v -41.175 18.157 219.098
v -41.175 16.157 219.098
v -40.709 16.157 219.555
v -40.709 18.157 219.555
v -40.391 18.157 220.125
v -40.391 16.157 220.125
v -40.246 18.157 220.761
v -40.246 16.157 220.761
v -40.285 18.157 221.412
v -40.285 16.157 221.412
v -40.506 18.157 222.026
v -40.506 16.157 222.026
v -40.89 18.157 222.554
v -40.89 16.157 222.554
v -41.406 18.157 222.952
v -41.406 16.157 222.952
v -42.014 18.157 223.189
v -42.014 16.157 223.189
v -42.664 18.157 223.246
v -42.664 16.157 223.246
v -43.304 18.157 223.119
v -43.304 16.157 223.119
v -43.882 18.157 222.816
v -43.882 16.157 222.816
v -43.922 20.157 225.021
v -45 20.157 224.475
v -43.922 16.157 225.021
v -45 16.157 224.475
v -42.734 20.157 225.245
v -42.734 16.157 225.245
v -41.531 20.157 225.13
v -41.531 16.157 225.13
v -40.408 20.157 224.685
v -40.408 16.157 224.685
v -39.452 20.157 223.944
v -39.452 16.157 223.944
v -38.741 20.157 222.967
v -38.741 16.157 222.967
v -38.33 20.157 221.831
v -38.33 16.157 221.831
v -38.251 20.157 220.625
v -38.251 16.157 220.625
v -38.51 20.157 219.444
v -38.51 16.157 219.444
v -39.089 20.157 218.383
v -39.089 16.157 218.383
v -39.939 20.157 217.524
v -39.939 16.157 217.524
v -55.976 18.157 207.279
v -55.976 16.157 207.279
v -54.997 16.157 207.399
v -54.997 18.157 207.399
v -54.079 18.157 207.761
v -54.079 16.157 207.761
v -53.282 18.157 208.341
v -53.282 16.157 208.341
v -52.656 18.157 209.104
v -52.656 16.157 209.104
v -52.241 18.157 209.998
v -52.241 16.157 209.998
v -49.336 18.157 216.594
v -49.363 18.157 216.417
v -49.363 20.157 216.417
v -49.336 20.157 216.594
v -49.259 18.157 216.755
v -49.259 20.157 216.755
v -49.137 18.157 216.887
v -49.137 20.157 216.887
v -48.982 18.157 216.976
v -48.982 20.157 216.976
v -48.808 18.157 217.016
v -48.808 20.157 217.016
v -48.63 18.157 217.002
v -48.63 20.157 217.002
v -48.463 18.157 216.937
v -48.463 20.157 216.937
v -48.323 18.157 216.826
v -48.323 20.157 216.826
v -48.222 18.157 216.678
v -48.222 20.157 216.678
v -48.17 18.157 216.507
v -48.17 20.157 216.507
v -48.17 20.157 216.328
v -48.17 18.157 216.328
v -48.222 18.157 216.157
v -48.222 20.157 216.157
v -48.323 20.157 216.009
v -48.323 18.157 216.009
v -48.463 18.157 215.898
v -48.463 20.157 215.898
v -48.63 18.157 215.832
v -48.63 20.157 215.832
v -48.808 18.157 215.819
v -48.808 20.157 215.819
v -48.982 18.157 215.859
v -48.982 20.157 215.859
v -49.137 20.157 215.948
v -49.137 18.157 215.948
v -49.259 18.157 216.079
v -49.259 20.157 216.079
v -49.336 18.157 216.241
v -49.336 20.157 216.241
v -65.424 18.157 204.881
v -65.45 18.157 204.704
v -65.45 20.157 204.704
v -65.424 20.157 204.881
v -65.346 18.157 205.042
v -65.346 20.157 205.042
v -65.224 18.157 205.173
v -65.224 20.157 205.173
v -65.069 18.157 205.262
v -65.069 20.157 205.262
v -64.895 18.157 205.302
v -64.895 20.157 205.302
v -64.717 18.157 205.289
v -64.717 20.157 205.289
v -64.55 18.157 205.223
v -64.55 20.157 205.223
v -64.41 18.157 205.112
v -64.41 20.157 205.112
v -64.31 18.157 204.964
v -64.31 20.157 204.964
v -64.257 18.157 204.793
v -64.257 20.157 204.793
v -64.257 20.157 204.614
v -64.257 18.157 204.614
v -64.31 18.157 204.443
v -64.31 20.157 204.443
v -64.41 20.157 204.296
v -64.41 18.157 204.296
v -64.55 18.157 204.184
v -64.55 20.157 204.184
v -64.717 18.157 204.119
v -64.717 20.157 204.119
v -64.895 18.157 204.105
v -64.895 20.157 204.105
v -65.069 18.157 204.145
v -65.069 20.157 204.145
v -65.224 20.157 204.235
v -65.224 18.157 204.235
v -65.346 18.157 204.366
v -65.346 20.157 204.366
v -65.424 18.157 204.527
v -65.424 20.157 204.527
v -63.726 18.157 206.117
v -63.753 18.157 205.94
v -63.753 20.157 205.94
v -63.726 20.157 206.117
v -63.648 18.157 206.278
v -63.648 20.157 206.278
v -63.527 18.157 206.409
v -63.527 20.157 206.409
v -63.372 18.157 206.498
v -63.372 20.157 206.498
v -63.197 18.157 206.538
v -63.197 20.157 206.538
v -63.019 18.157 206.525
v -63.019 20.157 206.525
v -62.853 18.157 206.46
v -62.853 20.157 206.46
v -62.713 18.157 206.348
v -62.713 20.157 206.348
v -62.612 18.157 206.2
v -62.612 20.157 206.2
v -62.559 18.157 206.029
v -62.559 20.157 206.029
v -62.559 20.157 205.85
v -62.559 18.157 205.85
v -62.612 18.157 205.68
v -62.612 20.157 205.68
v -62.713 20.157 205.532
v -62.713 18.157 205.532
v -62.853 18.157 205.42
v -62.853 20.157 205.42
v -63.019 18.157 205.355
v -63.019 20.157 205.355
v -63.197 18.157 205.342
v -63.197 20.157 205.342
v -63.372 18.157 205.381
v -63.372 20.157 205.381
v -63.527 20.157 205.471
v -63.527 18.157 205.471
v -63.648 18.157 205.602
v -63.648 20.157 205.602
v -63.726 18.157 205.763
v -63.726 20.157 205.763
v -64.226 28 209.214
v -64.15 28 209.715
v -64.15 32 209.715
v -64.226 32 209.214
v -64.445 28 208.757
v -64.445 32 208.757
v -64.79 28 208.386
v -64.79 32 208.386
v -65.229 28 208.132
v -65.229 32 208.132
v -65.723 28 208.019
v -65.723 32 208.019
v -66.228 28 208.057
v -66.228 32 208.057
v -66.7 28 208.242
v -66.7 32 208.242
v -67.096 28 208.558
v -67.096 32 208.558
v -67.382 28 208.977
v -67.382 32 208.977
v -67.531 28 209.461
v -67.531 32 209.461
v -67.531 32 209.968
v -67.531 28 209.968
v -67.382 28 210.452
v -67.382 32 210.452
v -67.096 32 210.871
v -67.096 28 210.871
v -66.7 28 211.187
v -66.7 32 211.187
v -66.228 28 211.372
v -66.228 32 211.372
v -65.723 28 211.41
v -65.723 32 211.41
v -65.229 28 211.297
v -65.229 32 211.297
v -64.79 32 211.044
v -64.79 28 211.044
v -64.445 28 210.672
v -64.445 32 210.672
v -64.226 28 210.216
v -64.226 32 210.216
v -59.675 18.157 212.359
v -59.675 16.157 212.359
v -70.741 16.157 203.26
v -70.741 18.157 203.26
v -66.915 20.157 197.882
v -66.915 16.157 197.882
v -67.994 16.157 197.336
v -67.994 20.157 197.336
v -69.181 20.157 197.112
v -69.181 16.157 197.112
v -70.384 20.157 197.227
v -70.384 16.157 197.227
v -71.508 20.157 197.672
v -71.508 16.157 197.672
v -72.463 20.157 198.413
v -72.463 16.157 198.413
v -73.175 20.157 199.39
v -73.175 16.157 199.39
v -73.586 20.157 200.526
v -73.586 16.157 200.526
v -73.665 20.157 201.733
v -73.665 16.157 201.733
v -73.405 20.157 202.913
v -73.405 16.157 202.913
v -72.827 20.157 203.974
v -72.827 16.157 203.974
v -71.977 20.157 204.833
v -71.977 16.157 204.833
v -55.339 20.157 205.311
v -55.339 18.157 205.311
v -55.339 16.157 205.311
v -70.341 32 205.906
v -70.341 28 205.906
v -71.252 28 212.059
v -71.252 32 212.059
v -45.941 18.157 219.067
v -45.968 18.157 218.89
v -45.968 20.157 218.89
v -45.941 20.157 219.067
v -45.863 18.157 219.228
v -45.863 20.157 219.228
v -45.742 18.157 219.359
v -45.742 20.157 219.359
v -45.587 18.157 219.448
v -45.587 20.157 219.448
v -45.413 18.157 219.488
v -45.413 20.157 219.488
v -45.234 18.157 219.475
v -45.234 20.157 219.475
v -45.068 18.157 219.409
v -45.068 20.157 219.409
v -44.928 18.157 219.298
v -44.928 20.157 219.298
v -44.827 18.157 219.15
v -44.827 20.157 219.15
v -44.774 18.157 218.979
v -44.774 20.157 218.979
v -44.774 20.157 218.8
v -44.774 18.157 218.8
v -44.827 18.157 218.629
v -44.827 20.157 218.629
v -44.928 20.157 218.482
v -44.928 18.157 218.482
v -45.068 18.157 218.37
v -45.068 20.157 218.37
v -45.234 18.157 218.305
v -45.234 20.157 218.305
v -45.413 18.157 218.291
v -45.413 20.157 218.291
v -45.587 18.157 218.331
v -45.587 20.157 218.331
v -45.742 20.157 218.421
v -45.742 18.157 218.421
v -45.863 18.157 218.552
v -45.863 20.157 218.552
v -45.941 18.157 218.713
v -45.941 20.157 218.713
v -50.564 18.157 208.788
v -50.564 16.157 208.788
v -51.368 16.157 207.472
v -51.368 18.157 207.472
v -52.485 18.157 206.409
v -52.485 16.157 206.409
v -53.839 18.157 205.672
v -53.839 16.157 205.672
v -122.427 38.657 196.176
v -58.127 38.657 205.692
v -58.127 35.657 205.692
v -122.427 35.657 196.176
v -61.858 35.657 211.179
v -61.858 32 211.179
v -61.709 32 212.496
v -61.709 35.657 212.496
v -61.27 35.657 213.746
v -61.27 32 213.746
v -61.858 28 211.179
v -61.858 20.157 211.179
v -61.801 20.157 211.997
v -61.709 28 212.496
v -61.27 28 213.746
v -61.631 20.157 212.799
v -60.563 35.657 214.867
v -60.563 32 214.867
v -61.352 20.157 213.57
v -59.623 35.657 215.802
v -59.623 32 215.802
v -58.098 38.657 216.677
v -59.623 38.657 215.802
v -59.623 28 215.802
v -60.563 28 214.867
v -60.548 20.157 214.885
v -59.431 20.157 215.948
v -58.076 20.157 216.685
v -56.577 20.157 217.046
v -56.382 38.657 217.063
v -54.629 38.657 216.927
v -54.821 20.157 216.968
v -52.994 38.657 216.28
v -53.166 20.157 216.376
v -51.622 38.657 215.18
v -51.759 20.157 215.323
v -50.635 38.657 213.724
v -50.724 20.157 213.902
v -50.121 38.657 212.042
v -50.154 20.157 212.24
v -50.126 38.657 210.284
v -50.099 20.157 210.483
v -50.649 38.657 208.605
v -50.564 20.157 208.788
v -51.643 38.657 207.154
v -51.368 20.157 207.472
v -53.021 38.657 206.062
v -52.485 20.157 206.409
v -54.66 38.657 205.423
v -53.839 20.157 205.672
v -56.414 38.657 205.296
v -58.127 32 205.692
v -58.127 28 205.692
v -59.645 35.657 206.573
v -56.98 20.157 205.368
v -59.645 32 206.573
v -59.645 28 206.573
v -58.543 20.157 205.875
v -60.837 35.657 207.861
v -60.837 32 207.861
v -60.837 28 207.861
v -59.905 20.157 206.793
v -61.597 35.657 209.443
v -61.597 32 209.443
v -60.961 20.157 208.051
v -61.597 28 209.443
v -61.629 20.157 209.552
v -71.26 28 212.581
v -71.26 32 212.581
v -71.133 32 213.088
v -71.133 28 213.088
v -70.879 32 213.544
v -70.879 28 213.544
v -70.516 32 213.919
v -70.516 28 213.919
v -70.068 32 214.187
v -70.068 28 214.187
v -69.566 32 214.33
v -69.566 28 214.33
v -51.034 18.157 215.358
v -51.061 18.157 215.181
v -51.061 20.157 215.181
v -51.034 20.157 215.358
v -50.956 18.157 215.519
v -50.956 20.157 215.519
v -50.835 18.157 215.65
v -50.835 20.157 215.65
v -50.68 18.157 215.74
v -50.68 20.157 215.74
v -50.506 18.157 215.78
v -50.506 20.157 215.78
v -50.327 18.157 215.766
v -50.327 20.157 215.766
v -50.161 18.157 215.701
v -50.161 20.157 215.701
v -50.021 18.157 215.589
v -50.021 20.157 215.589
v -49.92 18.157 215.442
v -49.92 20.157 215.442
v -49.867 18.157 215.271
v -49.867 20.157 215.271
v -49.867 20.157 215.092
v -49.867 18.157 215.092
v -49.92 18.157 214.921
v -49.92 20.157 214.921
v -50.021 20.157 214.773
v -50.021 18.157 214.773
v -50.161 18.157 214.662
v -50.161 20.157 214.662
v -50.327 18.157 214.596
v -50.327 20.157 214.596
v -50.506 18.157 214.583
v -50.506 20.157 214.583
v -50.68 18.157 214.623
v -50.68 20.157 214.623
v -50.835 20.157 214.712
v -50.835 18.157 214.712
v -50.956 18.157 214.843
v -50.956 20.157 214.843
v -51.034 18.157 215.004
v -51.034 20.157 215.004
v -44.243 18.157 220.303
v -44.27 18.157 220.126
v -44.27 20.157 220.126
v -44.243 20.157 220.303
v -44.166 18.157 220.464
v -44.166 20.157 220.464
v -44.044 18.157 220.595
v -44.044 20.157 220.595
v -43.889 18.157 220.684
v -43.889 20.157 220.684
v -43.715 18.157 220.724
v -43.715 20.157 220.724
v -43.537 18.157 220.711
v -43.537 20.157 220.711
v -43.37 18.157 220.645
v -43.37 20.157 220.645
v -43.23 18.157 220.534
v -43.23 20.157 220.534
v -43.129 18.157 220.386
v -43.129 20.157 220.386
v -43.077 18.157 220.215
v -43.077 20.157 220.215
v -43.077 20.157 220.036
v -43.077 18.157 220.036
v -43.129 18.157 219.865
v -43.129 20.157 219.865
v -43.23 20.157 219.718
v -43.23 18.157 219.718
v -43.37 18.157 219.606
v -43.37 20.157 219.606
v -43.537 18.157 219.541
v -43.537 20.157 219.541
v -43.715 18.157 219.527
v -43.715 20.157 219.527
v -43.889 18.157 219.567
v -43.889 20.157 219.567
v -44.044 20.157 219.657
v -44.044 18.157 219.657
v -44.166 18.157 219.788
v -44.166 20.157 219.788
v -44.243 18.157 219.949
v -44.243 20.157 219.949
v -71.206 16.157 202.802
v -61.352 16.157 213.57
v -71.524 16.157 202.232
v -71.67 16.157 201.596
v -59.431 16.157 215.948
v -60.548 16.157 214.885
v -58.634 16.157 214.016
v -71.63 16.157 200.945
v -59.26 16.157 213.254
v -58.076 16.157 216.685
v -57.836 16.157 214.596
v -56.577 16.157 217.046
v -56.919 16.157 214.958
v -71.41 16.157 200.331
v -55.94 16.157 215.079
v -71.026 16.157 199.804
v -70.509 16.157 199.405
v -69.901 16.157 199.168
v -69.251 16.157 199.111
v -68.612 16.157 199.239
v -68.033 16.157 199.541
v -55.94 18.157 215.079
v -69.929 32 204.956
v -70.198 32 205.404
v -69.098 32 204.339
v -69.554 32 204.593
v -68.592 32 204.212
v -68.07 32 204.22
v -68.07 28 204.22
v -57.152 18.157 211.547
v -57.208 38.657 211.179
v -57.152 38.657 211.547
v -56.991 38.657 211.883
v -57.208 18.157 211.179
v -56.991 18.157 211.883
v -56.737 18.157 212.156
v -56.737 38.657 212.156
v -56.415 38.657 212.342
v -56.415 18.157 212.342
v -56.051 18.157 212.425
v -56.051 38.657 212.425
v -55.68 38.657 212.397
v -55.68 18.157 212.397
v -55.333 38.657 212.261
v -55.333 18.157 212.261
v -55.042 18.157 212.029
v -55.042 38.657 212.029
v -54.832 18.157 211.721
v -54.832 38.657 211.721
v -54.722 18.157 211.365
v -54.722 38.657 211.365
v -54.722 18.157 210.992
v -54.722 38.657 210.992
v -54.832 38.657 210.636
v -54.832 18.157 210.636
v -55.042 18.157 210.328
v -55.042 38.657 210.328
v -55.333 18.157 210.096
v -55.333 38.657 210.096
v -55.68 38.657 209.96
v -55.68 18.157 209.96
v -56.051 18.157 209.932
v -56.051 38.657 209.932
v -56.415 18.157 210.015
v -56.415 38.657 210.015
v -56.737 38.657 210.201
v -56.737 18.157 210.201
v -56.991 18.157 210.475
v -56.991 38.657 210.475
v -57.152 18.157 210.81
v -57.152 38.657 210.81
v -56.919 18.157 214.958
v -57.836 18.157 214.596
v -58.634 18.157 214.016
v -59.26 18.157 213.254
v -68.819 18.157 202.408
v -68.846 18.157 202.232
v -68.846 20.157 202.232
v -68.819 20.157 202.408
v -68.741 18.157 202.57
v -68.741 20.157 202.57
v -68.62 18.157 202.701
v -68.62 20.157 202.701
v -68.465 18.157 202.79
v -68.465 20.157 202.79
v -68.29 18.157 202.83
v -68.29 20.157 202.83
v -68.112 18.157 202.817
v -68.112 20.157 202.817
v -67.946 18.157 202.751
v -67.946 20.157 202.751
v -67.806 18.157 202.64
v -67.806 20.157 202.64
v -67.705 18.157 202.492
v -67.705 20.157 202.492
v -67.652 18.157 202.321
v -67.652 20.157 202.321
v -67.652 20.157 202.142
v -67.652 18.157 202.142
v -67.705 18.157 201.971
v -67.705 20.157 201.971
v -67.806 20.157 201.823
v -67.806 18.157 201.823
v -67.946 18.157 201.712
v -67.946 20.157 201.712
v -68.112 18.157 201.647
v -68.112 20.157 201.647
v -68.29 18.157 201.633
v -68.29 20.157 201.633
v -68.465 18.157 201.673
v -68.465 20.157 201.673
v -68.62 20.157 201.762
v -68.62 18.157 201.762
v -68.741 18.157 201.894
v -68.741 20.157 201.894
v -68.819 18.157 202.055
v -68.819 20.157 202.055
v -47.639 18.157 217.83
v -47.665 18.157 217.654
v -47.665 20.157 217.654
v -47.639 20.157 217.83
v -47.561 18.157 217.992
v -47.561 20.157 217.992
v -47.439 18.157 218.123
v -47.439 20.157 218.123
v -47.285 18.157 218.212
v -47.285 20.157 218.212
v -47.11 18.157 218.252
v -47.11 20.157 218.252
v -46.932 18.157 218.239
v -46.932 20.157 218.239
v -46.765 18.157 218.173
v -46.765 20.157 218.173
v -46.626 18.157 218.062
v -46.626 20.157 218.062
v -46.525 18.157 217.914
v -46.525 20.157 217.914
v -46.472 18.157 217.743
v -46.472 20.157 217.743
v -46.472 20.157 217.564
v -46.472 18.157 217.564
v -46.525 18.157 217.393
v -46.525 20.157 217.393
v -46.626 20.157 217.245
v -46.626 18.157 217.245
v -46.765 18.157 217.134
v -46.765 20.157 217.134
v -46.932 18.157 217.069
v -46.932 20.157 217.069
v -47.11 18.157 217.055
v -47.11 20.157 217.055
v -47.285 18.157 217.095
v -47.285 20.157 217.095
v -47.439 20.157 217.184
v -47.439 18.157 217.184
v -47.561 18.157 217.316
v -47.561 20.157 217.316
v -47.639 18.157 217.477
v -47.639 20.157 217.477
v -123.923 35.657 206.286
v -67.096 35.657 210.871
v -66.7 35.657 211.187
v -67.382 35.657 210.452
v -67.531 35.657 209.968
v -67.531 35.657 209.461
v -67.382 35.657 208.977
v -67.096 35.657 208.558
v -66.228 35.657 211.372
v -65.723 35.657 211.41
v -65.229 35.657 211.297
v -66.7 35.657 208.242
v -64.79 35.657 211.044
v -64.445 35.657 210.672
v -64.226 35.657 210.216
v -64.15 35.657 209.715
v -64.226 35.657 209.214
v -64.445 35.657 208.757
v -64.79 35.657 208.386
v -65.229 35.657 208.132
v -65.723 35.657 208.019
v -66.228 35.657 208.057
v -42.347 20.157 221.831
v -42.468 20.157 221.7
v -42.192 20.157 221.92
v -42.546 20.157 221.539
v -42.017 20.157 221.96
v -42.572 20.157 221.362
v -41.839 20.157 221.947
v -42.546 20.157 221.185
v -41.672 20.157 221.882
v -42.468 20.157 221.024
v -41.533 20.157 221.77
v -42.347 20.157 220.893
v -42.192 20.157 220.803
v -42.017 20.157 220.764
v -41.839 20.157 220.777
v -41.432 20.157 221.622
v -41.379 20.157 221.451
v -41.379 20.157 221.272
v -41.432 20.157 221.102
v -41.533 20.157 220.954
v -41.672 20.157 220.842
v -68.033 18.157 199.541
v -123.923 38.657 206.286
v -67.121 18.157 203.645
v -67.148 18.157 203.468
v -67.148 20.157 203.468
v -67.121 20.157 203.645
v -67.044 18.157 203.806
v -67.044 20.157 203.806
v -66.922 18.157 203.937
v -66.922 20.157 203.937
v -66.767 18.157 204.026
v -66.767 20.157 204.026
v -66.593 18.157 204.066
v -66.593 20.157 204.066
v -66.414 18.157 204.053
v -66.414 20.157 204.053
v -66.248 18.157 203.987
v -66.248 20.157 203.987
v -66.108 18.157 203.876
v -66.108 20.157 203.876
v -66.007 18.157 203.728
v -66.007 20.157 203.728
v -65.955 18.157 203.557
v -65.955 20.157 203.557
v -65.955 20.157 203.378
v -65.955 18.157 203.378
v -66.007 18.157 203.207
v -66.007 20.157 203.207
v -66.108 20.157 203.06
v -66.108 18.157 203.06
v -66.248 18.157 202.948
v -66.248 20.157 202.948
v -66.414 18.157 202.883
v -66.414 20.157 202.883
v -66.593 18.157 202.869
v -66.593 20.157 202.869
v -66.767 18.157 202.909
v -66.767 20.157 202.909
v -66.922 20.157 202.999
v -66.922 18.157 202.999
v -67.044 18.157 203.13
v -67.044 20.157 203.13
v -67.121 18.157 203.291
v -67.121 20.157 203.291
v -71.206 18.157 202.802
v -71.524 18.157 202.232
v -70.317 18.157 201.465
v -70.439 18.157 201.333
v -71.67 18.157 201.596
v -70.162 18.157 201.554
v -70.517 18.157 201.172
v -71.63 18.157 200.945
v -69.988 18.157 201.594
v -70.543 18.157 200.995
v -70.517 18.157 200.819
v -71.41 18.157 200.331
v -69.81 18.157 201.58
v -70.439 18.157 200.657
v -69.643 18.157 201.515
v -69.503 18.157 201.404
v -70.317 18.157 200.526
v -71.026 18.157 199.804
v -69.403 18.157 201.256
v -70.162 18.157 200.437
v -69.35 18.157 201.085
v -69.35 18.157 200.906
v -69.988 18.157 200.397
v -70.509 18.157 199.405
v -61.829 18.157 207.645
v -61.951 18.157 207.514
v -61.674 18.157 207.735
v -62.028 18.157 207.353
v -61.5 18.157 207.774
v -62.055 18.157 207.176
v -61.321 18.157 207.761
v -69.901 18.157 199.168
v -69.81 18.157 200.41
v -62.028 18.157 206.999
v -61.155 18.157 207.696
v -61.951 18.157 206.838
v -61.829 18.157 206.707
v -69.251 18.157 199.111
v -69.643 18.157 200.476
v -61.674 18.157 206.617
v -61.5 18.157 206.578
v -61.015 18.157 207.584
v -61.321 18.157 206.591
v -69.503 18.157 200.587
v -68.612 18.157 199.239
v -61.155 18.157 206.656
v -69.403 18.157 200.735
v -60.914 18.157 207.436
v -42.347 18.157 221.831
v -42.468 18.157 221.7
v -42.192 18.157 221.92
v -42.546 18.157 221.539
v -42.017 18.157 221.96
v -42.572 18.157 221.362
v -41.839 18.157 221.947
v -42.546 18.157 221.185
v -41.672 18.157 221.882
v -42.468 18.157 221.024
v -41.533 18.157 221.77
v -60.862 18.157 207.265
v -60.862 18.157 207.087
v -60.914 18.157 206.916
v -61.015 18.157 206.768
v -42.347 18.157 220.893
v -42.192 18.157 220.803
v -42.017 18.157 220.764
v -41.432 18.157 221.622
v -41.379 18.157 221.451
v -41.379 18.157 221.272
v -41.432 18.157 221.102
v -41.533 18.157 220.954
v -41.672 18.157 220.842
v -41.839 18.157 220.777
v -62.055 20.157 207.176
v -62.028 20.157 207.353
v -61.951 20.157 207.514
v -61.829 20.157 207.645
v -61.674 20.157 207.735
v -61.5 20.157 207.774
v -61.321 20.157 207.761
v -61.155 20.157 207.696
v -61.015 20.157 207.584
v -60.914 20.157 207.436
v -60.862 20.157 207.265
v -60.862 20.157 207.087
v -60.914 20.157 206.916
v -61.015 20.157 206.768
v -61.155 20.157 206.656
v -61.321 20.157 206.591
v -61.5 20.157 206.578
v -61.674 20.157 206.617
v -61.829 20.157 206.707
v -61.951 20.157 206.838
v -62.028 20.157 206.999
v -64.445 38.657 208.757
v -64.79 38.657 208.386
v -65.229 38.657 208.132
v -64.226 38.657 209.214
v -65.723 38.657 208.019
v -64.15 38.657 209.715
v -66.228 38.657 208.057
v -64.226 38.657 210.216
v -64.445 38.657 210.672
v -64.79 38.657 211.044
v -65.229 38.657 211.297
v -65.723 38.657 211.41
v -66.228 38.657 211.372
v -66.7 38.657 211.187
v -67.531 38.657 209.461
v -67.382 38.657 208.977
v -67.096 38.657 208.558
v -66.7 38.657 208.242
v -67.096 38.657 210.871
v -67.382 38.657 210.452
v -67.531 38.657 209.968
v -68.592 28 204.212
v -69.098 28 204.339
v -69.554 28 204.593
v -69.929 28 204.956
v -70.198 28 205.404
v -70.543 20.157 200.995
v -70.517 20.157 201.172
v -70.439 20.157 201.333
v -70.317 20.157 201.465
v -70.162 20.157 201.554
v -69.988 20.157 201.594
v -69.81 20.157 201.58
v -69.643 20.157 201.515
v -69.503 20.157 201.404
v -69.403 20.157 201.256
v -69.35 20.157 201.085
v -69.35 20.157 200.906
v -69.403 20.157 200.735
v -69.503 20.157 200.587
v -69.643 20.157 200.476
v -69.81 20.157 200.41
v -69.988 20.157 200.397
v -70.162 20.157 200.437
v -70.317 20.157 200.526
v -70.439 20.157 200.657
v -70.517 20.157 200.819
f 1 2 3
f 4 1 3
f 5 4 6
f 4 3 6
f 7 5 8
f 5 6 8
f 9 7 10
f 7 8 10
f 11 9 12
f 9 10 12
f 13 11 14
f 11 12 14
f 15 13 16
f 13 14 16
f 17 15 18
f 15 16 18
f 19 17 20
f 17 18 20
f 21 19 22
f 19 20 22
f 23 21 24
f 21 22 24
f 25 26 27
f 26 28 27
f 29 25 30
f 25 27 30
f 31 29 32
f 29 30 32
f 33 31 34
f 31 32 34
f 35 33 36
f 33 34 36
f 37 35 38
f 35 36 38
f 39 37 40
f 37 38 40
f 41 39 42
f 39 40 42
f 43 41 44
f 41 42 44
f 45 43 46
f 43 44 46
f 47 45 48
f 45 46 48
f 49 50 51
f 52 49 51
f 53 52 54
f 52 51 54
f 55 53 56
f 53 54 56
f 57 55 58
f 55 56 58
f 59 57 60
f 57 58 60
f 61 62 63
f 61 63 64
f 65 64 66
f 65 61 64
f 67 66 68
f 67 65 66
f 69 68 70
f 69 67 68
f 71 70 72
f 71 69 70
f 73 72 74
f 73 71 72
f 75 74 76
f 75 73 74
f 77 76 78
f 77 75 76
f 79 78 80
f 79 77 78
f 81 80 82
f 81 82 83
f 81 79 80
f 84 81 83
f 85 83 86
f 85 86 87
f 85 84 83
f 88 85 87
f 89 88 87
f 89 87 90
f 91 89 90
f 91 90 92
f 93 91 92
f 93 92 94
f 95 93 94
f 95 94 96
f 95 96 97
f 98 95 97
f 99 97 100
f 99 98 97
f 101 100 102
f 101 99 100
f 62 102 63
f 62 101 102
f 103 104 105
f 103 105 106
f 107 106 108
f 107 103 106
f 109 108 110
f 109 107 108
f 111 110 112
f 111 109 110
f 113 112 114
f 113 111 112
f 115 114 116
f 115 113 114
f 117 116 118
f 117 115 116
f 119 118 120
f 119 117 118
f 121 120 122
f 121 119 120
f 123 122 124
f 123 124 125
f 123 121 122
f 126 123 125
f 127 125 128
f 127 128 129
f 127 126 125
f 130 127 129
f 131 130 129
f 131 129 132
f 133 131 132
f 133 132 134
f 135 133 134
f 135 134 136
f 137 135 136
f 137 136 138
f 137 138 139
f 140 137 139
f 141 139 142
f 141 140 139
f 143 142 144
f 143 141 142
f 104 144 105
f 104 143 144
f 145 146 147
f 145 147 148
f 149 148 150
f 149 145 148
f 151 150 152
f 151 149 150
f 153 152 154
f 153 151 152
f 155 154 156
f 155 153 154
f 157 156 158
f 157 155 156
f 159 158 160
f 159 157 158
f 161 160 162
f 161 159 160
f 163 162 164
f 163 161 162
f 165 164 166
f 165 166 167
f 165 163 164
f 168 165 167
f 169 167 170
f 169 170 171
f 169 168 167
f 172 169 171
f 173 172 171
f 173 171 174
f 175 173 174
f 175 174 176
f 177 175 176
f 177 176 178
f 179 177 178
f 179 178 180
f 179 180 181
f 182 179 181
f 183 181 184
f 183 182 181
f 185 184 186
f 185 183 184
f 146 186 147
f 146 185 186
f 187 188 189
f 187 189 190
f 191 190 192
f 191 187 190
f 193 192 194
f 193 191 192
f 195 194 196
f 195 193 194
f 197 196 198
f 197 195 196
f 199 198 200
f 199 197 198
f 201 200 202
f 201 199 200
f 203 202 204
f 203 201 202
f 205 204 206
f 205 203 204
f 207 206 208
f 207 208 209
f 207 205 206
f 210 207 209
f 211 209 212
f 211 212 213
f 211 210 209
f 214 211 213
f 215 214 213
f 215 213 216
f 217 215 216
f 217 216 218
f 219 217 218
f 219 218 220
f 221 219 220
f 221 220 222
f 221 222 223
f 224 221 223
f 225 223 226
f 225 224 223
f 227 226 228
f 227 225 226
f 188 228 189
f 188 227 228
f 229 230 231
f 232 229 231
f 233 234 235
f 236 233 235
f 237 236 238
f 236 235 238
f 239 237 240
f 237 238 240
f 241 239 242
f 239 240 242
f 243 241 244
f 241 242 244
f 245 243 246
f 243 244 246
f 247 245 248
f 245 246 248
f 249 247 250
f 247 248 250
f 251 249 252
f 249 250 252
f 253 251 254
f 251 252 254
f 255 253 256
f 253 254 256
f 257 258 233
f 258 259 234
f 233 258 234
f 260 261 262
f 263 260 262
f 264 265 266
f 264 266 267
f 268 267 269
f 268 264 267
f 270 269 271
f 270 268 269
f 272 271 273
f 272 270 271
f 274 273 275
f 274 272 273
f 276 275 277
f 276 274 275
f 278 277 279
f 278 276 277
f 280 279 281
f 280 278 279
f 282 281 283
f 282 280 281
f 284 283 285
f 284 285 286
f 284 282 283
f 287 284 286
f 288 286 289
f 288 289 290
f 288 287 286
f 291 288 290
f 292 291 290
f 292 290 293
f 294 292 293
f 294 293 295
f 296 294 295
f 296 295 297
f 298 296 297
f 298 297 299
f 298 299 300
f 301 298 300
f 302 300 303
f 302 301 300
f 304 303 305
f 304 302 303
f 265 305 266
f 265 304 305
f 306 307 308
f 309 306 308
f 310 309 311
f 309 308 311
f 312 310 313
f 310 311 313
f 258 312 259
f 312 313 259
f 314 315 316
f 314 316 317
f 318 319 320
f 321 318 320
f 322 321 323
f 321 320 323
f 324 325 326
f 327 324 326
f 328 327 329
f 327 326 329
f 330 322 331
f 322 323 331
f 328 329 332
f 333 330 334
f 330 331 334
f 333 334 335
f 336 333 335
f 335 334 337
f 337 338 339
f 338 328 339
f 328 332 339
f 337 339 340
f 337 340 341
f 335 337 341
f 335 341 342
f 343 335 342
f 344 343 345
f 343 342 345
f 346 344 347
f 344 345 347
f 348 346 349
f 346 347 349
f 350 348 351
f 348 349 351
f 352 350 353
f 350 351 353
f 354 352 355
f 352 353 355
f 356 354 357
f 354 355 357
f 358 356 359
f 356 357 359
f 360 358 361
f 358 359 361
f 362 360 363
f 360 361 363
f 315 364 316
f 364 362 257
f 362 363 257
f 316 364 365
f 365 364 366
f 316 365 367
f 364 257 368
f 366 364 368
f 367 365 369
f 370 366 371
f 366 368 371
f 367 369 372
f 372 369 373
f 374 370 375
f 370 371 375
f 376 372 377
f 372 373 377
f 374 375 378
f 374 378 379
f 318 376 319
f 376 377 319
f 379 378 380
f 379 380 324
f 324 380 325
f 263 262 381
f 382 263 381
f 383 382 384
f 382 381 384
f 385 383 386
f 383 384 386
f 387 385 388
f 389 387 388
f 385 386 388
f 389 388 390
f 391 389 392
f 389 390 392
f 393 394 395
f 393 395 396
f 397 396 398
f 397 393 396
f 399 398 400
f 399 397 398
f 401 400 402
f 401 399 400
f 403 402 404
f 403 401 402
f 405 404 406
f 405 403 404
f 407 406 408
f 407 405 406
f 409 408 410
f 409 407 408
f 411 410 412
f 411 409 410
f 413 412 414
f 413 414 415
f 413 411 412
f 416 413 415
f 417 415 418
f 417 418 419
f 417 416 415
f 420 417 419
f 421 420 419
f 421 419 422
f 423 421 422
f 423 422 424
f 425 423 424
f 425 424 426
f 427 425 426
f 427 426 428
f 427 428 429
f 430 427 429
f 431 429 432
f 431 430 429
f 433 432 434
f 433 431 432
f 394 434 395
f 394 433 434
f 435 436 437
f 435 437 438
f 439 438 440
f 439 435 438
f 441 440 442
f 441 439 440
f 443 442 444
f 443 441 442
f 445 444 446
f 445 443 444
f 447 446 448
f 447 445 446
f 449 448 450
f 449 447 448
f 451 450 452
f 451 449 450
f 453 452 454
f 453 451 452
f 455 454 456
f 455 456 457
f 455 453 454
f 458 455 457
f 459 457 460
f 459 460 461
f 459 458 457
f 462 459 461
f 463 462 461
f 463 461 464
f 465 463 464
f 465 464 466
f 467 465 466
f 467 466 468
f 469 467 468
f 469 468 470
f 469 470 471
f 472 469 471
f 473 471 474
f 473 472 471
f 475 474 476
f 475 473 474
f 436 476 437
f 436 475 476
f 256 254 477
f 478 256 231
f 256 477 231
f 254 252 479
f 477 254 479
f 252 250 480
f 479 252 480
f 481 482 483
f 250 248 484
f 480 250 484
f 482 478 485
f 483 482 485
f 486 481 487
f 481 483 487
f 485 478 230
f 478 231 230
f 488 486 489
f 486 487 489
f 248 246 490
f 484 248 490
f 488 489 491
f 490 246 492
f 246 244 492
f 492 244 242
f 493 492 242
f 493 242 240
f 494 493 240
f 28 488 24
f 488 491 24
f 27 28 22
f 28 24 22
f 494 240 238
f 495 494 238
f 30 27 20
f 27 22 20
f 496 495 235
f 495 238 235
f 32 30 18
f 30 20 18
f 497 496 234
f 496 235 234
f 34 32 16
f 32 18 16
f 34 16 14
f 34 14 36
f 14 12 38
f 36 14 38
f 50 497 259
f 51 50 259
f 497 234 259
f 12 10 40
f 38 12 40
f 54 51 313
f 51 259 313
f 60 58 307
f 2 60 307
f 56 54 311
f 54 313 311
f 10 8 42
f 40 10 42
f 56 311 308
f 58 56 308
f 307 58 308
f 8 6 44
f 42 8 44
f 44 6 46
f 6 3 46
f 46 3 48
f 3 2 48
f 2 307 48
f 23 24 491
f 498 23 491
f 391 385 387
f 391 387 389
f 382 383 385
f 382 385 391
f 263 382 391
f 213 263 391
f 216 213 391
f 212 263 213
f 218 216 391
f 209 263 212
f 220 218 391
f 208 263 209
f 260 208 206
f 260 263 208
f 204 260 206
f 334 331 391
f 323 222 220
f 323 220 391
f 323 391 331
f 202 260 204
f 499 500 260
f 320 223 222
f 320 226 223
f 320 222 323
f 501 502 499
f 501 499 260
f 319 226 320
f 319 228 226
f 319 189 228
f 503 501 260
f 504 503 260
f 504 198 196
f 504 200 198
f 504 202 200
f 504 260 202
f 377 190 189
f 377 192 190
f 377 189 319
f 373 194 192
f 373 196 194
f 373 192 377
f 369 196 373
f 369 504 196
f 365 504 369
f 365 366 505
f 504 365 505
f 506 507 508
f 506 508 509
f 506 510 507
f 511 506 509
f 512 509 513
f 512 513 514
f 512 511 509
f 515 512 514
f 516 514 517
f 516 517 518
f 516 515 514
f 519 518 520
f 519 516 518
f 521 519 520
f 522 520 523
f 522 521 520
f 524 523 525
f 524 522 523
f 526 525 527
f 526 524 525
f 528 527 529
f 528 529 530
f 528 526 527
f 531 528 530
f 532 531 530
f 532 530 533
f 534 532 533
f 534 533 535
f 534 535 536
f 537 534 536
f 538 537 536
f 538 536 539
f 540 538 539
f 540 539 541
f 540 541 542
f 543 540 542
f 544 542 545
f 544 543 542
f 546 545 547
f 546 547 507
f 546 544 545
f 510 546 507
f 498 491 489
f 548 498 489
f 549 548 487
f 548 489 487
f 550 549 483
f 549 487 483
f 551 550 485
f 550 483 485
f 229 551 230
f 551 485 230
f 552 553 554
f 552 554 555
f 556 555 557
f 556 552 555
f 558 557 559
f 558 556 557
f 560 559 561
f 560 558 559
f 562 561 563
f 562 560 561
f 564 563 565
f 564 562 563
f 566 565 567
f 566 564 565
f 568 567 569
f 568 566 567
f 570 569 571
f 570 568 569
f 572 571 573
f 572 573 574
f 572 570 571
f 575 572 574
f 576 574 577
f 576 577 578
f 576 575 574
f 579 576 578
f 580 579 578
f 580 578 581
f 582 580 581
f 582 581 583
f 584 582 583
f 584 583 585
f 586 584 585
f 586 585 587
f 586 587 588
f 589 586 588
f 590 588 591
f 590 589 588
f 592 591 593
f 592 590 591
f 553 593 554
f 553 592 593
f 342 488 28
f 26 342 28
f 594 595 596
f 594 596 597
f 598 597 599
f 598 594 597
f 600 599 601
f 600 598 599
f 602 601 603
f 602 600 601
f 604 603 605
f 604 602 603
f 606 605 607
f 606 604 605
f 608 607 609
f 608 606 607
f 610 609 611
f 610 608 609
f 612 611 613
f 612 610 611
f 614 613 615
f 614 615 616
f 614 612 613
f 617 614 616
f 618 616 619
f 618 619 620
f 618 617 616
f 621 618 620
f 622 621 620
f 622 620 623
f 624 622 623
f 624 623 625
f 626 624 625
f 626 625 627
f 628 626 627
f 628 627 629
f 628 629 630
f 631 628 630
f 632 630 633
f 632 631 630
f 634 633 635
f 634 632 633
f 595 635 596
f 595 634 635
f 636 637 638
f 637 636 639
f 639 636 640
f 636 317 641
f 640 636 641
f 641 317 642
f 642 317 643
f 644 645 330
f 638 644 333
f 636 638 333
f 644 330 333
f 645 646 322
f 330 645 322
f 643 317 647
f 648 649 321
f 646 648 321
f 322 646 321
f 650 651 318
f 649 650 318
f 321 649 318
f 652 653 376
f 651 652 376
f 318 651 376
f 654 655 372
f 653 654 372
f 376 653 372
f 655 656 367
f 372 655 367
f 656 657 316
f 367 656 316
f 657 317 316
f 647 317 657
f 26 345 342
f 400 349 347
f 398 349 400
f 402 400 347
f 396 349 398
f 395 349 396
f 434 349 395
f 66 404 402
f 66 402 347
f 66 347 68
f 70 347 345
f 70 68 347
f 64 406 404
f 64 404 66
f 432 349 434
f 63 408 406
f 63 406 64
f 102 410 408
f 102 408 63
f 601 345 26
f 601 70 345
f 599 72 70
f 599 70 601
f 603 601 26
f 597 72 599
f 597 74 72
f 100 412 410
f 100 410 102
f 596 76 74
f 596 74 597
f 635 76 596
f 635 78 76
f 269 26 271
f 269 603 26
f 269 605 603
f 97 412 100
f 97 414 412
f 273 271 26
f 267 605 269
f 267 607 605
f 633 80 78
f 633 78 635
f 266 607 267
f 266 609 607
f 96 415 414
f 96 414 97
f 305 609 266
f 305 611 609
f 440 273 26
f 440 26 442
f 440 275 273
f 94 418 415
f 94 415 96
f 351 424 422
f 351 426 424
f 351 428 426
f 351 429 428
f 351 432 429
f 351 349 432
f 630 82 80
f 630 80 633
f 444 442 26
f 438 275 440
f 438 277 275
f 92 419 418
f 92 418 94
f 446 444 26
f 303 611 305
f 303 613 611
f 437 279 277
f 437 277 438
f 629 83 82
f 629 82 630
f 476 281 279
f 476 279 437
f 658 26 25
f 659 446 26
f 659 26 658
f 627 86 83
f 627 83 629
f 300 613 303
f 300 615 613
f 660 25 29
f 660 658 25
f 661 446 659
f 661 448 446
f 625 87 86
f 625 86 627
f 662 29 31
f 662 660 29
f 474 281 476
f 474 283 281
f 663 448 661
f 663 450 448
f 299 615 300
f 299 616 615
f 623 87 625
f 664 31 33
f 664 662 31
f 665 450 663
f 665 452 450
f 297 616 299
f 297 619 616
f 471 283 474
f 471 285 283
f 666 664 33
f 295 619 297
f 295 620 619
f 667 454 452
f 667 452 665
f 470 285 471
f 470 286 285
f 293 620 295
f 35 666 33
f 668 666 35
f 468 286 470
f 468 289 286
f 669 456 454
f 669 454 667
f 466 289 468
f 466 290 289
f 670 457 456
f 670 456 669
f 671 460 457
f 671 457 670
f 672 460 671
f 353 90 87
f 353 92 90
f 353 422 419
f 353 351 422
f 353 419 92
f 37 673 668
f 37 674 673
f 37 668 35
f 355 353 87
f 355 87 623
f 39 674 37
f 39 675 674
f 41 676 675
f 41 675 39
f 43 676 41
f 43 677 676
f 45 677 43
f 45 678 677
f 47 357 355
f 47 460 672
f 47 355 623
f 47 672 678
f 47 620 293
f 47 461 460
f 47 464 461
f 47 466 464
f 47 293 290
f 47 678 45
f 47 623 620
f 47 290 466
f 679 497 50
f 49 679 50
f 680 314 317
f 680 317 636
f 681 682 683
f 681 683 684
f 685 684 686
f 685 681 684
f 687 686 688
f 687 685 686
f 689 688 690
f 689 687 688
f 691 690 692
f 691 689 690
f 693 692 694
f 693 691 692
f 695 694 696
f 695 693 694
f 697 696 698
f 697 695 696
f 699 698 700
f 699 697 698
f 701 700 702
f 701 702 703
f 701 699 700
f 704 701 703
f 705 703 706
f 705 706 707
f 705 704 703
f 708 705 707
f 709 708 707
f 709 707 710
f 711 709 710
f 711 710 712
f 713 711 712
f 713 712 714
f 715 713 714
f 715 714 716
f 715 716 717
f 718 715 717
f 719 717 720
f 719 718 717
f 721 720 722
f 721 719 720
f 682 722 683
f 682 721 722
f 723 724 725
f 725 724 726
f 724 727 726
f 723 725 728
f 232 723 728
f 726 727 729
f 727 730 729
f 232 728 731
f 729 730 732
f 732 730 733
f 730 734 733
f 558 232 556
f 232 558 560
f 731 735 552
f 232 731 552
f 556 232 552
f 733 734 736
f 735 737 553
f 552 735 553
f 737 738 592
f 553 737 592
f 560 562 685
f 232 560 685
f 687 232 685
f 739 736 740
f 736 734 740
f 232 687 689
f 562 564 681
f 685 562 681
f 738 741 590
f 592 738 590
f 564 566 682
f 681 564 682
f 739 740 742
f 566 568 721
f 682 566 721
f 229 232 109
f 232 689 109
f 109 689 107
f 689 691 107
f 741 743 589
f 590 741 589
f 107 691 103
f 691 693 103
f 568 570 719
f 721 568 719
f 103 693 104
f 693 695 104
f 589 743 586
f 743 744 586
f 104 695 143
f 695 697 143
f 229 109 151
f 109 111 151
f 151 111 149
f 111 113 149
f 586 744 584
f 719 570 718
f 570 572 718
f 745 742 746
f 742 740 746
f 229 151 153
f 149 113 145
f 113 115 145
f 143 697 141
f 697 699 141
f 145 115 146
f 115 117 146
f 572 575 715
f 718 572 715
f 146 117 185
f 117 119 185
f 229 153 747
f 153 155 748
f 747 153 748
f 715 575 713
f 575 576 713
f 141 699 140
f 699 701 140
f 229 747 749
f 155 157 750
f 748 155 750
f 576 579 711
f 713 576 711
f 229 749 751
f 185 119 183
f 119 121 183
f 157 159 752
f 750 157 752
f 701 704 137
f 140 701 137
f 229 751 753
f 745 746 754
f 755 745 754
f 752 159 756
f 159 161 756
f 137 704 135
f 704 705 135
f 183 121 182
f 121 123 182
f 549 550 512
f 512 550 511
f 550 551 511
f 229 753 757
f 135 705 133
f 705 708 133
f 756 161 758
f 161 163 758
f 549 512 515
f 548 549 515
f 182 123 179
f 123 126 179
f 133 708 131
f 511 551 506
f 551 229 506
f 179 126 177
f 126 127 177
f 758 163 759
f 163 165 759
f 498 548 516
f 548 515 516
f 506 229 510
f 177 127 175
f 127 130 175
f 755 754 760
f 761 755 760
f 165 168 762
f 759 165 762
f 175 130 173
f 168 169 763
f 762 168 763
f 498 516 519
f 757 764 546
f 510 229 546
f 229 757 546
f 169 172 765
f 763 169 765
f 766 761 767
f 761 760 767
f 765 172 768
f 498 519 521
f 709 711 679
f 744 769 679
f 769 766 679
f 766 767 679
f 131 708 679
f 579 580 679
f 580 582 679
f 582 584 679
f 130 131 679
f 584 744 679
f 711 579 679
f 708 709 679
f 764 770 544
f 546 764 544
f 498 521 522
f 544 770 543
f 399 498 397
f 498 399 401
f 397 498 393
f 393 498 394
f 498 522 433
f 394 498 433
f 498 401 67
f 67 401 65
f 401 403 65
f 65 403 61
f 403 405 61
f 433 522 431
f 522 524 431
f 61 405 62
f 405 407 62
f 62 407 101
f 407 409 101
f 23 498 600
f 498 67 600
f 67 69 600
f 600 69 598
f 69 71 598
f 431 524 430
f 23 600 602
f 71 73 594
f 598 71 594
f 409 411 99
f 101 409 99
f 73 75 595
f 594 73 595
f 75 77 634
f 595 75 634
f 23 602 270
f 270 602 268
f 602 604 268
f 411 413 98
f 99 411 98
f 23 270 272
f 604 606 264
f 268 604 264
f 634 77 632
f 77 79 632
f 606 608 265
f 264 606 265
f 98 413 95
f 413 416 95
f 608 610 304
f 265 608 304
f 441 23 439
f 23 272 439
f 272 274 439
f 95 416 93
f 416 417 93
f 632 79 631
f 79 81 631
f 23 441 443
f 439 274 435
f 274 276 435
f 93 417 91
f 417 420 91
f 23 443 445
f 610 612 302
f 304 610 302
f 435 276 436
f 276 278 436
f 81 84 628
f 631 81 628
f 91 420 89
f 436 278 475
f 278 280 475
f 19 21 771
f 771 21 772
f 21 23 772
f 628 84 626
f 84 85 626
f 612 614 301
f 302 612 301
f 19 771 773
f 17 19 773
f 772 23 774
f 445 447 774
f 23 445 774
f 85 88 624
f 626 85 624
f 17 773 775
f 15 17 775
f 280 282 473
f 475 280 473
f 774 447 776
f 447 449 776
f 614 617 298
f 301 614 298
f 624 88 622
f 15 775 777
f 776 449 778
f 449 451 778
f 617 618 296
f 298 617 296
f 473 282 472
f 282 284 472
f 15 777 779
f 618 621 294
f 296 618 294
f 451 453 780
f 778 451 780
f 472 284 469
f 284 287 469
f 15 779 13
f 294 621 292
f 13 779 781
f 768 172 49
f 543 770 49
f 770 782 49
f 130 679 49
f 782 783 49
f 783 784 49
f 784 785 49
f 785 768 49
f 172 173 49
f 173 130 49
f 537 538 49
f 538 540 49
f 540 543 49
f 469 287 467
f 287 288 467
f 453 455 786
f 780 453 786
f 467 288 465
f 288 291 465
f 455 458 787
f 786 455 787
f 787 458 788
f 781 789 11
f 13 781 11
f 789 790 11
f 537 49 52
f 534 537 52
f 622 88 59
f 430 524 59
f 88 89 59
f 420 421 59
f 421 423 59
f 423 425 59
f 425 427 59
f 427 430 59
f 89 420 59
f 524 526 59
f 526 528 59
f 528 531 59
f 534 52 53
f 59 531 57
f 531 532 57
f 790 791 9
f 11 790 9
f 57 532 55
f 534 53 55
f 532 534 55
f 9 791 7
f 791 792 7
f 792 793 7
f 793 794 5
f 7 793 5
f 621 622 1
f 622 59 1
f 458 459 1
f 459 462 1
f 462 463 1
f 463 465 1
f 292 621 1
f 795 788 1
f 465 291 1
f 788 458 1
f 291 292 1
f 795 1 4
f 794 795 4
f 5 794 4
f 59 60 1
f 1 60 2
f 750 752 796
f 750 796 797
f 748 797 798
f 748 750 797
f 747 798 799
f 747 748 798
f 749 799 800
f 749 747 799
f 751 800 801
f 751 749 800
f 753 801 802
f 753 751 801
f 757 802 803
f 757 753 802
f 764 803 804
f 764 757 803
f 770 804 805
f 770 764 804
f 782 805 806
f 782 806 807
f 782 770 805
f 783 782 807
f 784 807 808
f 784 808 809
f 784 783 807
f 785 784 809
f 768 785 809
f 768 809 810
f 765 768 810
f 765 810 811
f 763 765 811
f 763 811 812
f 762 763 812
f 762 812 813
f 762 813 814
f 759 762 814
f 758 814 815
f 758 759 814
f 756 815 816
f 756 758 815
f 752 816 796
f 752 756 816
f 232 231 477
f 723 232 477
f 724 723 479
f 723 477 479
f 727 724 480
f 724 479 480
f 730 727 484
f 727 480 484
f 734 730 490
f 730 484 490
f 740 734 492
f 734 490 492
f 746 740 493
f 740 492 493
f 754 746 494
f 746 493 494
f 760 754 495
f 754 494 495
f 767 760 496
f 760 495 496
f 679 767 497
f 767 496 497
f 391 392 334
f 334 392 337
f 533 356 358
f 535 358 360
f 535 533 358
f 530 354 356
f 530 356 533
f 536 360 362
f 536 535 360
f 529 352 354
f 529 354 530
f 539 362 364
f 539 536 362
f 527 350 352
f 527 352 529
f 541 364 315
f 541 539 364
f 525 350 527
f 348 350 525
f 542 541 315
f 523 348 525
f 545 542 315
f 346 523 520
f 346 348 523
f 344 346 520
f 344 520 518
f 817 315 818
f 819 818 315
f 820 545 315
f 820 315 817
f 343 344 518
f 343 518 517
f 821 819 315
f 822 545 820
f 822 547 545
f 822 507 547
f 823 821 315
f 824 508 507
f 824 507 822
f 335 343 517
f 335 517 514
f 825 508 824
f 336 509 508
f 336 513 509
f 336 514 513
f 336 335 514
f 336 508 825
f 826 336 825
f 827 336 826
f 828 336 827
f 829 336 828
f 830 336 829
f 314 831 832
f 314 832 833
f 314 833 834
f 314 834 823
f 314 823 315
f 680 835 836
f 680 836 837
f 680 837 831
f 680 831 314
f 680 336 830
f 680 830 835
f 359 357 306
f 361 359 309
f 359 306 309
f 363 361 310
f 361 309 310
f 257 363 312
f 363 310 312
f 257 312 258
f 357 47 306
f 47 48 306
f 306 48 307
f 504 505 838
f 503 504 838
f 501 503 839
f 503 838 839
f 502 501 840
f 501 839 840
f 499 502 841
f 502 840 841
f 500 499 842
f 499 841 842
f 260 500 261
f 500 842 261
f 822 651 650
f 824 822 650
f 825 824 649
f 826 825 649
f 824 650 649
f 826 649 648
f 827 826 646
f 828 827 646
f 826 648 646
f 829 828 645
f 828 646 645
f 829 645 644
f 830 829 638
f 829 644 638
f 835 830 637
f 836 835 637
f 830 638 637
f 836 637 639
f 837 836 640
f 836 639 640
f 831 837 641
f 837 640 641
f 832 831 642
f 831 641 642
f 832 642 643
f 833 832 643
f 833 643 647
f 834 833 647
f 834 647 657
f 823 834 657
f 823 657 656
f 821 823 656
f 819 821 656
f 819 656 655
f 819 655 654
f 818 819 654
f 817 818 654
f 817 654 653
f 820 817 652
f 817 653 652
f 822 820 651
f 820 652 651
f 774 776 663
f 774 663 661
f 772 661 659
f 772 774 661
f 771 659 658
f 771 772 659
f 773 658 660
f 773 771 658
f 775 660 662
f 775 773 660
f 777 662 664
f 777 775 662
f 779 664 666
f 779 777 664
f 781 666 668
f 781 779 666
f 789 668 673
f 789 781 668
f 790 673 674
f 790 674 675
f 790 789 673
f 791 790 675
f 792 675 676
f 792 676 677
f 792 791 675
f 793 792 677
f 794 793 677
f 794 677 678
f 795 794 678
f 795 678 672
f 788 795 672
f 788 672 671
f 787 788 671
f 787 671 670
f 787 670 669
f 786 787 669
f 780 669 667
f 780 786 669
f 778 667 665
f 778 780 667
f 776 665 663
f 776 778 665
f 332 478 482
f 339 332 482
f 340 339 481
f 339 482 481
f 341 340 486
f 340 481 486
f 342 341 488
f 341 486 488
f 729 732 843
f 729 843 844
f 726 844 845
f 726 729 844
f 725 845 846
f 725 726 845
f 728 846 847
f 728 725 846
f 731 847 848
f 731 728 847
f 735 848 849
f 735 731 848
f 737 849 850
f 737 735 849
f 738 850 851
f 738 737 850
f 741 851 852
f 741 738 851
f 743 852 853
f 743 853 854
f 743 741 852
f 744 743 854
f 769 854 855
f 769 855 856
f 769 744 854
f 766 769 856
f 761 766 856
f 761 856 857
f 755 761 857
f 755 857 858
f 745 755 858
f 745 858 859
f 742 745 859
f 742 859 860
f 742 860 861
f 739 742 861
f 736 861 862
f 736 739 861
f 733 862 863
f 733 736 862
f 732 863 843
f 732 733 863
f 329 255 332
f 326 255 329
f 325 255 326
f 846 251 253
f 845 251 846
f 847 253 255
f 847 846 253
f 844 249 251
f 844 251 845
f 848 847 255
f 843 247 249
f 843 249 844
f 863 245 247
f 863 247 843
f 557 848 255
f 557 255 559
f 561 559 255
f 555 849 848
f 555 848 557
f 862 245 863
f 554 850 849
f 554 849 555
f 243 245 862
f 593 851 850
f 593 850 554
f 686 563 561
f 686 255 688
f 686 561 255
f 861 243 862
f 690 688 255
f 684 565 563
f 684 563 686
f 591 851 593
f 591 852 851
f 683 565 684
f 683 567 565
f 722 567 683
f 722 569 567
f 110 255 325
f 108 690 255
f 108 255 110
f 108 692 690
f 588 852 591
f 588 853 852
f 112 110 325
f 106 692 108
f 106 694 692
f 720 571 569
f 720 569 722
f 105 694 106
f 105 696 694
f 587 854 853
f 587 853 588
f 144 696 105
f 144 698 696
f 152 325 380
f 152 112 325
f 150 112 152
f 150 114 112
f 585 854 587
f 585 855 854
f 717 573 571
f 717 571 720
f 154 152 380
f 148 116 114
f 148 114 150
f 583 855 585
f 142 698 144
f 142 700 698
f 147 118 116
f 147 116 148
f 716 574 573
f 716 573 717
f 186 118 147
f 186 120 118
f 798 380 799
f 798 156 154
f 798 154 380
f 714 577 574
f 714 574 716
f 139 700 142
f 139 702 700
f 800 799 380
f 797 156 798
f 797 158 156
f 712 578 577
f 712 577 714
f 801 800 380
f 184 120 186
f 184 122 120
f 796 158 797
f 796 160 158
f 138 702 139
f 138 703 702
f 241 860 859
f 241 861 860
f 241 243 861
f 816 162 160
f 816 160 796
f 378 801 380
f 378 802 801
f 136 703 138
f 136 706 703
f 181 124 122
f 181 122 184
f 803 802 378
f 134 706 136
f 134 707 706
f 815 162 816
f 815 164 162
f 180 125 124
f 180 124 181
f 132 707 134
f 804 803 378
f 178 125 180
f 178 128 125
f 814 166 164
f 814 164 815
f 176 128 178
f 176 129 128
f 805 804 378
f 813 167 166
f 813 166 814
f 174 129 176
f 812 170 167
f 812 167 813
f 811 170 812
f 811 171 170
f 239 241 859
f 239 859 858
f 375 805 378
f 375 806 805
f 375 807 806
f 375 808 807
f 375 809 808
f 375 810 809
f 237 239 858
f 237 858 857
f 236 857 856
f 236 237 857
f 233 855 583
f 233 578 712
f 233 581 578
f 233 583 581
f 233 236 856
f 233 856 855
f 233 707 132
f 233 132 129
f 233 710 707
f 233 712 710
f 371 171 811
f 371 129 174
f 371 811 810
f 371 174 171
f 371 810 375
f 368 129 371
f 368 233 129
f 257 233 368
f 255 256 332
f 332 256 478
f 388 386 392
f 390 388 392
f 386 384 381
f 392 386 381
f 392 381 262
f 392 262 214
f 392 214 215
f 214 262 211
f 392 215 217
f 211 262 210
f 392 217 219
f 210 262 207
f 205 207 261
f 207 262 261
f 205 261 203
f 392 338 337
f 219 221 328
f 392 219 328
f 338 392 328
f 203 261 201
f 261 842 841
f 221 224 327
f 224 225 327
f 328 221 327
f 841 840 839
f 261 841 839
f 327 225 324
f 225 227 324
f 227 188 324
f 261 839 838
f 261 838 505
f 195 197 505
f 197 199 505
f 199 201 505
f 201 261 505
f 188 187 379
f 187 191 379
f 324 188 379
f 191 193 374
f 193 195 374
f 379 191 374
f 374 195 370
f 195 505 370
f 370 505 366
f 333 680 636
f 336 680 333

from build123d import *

# Parameters (mm, degrees)
EXTRUDE_START       = -2
EXTRUDE_1_DEPTH     = 2
SKETCH_2_R          = 0.6
SKETCH_2_R_2        = 1.25
EXTRUDE_2_DEPTH     = 2
SKETCH_3_R          = 5.9
SKETCH_3_R_2        = 1.25
EXTRUDE_3_DEPTH     = 18.5
EXTRUDE_4_DEPTH     = 3
SKETCH_5_R          = 1.7
CUT_EXTRUDE_1_DEPTH = 3
SKETCH_6_R          = 1.7
EXTRUDE_5_DEPTH     = 4


# Read off the part's stored shape, not the designer's step: 填料-伸長1
with BuildPart() as part:
    # 填料-伸長1 outline → 填料-伸長1 (new body)
    with BuildSketch(Plane(origin=(0, 18.156954032, 0), x_dir=(1, 0, 0), z_dir=(0, 1, 0)).offset(EXTRUDE_START)):
        with BuildLine():
            Line((-71.976510321, -204.833021781), (-61.351692907, -213.569524655))
            ThreePointArc((-61.351692907, -213.569524655), (-59.430720516, -215.948258819), (-56.577073779, -217.046080048))
            Line((-56.577073779, -217.046080048), (-45.000342303, -224.475246616))
            ThreePointArc((-45.000342303, -224.475246616), (-39.06215434, -223.480955011), (-39.939141491, -217.524312868))
            Line((-39.939141491, -217.524312868), (-50.563958905, -208.787809993))
            ThreePointArc((-50.563958905, -208.787809993), (-52.484931295, -206.409075829), (-55.338578032, -205.311254601))
            Line((-55.338578032, -205.311254601), (-66.915309509, -197.882088033))
            ThreePointArc((-66.915309509, -197.882088033), (-72.853497472, -198.876379638), (-71.976510321, -204.833021781))
        make_face()
        with BuildLine():
            ThreePointArc((-55.939819286, -215.078625755), (-58.253468106, -214.331448143), (-59.674933886, -212.358967399))
            Line((-59.674933886, -212.358967399), (-70.741141252, -203.259521387))
            ThreePointArc((-70.741141252, -203.259521387), (-71.236686796, -200.053632048), (-68.033499603, -199.540910248))
            Line((-68.033499603, -199.540910248), (-55.975832526, -207.278708894))
            ThreePointArc((-55.975832526, -207.278708894), (-53.662183706, -208.025886506), (-52.240717926, -209.998367249))
            Line((-52.240717926, -209.998367249), (-41.17451056, -219.097813262))
            ThreePointArc((-41.17451056, -219.097813262), (-40.678965016, -222.303702601), (-43.882152209, -222.8164244))
            Line((-43.882152209, -222.8164244), (-55.939819286, -215.078625755))
        make_face(mode=Mode.SUBTRACT)
    extrude(amount=EXTRUDE_1_DEPTH)

    # 草圖2 → 填料-伸長2 (add)
    with BuildSketch(Plane(origin=(0, 18.156954032, 0), x_dir=(1, 0, 0), z_dir=(0, 1, 0))):
        with BuildLine():
            Line((-56.577073779, -217.046080048), (-45.000342303, -224.475246616))
            ThreePointArc((-45.000342303, -224.475246616), (-39.06215434, -223.480955011), (-39.939141491, -217.524312868))
            Line((-39.939141491, -217.524312868), (-50.563958905, -208.787809993))
            ThreePointArc((-50.563958905, -208.787809993), (-52.484931296, -206.409075829), (-55.338578032, -205.311254601))
            Line((-55.338578032, -205.311254601), (-66.915309509, -197.882088033))
            ThreePointArc((-66.915309509, -197.882088033), (-72.853497472, -198.876379638), (-71.976510321, -204.833021781))
            Line((-71.976510321, -204.833021781), (-61.351692907, -213.569524655))
            ThreePointArc((-61.351692907, -213.569524655), (-59.430720516, -215.948258819), (-56.577073779, -217.046080048))
        make_face()
        with Locations(Location((-69.943238255, -200.995433976, 0), (0, 0, 180))):
            Circle(SKETCH_2_R, mode=Mode.SUBTRACT)
        with Locations(Location((-68.245587045, -202.231549007, 0), (0, 0, 180))):
            Circle(SKETCH_2_R, mode=Mode.SUBTRACT)
        with Locations(Location((-66.547935835, -203.467664037, 0), (0, 0, 180))):
            Circle(SKETCH_2_R, mode=Mode.SUBTRACT)
        with Locations(Location((-64.850284625, -204.703779068, 0), (0, 0, 180))):
            Circle(SKETCH_2_R, mode=Mode.SUBTRACT)
        with Locations(Location((-63.152633415, -205.939894099, 0), (0, 0, 180))):
            Circle(SKETCH_2_R, mode=Mode.SUBTRACT)
        with Locations(Location((-61.454982205, -207.17600913, 0), (0, 0, 180))):
            Circle(SKETCH_2_R, mode=Mode.SUBTRACT)
        with Locations(Location((-55.957825906, -211.178667324, 0), (0, 0, 180))):
            Circle(SKETCH_2_R_2, mode=Mode.SUBTRACT)
        with Locations(Location((-50.460669607, -215.181325519, 0), (0, 0, 180))):
            Circle(SKETCH_2_R, mode=Mode.SUBTRACT)
        with Locations(Location((-48.763018397, -216.41744055, 0), (0, 0, 180))):
            Circle(SKETCH_2_R, mode=Mode.SUBTRACT)
        with Locations(Location((-47.065367187, -217.65355558, 0), (0, 0, 180))):
            Circle(SKETCH_2_R, mode=Mode.SUBTRACT)
        with Locations(Location((-45.367715977, -218.889670611, 0), (0, 0, 180))):
            Circle(SKETCH_2_R, mode=Mode.SUBTRACT)
        with Locations(Location((-43.670064767, -220.125785642, 0), (0, 0, 180))):
            Circle(SKETCH_2_R, mode=Mode.SUBTRACT)
        with Locations(Location((-41.972413557, -221.361900673, 0), (0, 0, 180))):
            Circle(SKETCH_2_R, mode=Mode.SUBTRACT)
    extrude(amount=EXTRUDE_2_DEPTH)

    # 草圖3 → 填料-伸長3 (add)
    with BuildSketch(Plane(origin=(0, 20.156954032, 0), x_dir=(1, 0, 0), z_dir=(0, 1, 0))):
        with Locations(Location((-55.957825906, -211.178667324, 0), (0, 0, 180))):
            Circle(SKETCH_3_R)
        with Locations(Location((-55.957825906, -211.178667324, 0), (0, 0, 180))):
            Circle(SKETCH_3_R_2, mode=Mode.SUBTRACT)
    extrude(amount=EXTRUDE_3_DEPTH)

    # 草圖4 → 填料-伸長4 (add)
    with BuildSketch(Plane(origin=(0, 38.656954032, 0), x_dir=(1, 0, 0), z_dir=(0, 1, 0))):
        Polygon((-59.623386181, -215.801833758), (-58.127150876, -205.691953447), (-122.426781037, -196.175779785), (-123.923016342, -206.285660097), align=None)
    extrude(amount=-EXTRUDE_4_DEPTH)

    # 草圖5 → 除料-伸長1 (cut)
    with BuildSketch(Plane.XZ.offset(-35.656954032)):
        with Locations((-65.8500767, 209.714640607)):
            Circle(SKETCH_5_R)
    extrude(amount=-CUT_EXTRUDE_1_DEPTH, mode=Mode.SUBTRACT)

    # 草圖6 → 填料-伸長5 (add)
    with BuildSketch(Plane(origin=(0, 28, 0), x_dir=(1, 0, 0), z_dir=(0, 1, 0))):
        with BuildLine():
            Line((-70.340889788, -205.906137252), (-71.251514406, -212.059117246))
            ThreePointArc((-71.251514406, -212.059117246), (-70.879084415, -213.543853469), (-69.565869591, -214.330372748))
            Line((-69.565869591, -214.330372748), (-59.623386181, -215.801833758))
            ThreePointArc((-59.623386181, -215.801833758), (-61.794253874, -210.314891561), (-58.127150876, -205.691953447))
            Line((-58.127150876, -205.691953447), (-68.069634286, -204.220492436))
            ThreePointArc((-68.069634286, -204.220492436), (-69.554370509, -204.592922428), (-70.340889788, -205.906137252))
        make_face()
        with Locations((-65.8500767, -209.714640607)):
            Circle(SKETCH_6_R, mode=Mode.SUBTRACT)
    extrude(amount=EXTRUDE_5_DEPTH)


solid = part.part
